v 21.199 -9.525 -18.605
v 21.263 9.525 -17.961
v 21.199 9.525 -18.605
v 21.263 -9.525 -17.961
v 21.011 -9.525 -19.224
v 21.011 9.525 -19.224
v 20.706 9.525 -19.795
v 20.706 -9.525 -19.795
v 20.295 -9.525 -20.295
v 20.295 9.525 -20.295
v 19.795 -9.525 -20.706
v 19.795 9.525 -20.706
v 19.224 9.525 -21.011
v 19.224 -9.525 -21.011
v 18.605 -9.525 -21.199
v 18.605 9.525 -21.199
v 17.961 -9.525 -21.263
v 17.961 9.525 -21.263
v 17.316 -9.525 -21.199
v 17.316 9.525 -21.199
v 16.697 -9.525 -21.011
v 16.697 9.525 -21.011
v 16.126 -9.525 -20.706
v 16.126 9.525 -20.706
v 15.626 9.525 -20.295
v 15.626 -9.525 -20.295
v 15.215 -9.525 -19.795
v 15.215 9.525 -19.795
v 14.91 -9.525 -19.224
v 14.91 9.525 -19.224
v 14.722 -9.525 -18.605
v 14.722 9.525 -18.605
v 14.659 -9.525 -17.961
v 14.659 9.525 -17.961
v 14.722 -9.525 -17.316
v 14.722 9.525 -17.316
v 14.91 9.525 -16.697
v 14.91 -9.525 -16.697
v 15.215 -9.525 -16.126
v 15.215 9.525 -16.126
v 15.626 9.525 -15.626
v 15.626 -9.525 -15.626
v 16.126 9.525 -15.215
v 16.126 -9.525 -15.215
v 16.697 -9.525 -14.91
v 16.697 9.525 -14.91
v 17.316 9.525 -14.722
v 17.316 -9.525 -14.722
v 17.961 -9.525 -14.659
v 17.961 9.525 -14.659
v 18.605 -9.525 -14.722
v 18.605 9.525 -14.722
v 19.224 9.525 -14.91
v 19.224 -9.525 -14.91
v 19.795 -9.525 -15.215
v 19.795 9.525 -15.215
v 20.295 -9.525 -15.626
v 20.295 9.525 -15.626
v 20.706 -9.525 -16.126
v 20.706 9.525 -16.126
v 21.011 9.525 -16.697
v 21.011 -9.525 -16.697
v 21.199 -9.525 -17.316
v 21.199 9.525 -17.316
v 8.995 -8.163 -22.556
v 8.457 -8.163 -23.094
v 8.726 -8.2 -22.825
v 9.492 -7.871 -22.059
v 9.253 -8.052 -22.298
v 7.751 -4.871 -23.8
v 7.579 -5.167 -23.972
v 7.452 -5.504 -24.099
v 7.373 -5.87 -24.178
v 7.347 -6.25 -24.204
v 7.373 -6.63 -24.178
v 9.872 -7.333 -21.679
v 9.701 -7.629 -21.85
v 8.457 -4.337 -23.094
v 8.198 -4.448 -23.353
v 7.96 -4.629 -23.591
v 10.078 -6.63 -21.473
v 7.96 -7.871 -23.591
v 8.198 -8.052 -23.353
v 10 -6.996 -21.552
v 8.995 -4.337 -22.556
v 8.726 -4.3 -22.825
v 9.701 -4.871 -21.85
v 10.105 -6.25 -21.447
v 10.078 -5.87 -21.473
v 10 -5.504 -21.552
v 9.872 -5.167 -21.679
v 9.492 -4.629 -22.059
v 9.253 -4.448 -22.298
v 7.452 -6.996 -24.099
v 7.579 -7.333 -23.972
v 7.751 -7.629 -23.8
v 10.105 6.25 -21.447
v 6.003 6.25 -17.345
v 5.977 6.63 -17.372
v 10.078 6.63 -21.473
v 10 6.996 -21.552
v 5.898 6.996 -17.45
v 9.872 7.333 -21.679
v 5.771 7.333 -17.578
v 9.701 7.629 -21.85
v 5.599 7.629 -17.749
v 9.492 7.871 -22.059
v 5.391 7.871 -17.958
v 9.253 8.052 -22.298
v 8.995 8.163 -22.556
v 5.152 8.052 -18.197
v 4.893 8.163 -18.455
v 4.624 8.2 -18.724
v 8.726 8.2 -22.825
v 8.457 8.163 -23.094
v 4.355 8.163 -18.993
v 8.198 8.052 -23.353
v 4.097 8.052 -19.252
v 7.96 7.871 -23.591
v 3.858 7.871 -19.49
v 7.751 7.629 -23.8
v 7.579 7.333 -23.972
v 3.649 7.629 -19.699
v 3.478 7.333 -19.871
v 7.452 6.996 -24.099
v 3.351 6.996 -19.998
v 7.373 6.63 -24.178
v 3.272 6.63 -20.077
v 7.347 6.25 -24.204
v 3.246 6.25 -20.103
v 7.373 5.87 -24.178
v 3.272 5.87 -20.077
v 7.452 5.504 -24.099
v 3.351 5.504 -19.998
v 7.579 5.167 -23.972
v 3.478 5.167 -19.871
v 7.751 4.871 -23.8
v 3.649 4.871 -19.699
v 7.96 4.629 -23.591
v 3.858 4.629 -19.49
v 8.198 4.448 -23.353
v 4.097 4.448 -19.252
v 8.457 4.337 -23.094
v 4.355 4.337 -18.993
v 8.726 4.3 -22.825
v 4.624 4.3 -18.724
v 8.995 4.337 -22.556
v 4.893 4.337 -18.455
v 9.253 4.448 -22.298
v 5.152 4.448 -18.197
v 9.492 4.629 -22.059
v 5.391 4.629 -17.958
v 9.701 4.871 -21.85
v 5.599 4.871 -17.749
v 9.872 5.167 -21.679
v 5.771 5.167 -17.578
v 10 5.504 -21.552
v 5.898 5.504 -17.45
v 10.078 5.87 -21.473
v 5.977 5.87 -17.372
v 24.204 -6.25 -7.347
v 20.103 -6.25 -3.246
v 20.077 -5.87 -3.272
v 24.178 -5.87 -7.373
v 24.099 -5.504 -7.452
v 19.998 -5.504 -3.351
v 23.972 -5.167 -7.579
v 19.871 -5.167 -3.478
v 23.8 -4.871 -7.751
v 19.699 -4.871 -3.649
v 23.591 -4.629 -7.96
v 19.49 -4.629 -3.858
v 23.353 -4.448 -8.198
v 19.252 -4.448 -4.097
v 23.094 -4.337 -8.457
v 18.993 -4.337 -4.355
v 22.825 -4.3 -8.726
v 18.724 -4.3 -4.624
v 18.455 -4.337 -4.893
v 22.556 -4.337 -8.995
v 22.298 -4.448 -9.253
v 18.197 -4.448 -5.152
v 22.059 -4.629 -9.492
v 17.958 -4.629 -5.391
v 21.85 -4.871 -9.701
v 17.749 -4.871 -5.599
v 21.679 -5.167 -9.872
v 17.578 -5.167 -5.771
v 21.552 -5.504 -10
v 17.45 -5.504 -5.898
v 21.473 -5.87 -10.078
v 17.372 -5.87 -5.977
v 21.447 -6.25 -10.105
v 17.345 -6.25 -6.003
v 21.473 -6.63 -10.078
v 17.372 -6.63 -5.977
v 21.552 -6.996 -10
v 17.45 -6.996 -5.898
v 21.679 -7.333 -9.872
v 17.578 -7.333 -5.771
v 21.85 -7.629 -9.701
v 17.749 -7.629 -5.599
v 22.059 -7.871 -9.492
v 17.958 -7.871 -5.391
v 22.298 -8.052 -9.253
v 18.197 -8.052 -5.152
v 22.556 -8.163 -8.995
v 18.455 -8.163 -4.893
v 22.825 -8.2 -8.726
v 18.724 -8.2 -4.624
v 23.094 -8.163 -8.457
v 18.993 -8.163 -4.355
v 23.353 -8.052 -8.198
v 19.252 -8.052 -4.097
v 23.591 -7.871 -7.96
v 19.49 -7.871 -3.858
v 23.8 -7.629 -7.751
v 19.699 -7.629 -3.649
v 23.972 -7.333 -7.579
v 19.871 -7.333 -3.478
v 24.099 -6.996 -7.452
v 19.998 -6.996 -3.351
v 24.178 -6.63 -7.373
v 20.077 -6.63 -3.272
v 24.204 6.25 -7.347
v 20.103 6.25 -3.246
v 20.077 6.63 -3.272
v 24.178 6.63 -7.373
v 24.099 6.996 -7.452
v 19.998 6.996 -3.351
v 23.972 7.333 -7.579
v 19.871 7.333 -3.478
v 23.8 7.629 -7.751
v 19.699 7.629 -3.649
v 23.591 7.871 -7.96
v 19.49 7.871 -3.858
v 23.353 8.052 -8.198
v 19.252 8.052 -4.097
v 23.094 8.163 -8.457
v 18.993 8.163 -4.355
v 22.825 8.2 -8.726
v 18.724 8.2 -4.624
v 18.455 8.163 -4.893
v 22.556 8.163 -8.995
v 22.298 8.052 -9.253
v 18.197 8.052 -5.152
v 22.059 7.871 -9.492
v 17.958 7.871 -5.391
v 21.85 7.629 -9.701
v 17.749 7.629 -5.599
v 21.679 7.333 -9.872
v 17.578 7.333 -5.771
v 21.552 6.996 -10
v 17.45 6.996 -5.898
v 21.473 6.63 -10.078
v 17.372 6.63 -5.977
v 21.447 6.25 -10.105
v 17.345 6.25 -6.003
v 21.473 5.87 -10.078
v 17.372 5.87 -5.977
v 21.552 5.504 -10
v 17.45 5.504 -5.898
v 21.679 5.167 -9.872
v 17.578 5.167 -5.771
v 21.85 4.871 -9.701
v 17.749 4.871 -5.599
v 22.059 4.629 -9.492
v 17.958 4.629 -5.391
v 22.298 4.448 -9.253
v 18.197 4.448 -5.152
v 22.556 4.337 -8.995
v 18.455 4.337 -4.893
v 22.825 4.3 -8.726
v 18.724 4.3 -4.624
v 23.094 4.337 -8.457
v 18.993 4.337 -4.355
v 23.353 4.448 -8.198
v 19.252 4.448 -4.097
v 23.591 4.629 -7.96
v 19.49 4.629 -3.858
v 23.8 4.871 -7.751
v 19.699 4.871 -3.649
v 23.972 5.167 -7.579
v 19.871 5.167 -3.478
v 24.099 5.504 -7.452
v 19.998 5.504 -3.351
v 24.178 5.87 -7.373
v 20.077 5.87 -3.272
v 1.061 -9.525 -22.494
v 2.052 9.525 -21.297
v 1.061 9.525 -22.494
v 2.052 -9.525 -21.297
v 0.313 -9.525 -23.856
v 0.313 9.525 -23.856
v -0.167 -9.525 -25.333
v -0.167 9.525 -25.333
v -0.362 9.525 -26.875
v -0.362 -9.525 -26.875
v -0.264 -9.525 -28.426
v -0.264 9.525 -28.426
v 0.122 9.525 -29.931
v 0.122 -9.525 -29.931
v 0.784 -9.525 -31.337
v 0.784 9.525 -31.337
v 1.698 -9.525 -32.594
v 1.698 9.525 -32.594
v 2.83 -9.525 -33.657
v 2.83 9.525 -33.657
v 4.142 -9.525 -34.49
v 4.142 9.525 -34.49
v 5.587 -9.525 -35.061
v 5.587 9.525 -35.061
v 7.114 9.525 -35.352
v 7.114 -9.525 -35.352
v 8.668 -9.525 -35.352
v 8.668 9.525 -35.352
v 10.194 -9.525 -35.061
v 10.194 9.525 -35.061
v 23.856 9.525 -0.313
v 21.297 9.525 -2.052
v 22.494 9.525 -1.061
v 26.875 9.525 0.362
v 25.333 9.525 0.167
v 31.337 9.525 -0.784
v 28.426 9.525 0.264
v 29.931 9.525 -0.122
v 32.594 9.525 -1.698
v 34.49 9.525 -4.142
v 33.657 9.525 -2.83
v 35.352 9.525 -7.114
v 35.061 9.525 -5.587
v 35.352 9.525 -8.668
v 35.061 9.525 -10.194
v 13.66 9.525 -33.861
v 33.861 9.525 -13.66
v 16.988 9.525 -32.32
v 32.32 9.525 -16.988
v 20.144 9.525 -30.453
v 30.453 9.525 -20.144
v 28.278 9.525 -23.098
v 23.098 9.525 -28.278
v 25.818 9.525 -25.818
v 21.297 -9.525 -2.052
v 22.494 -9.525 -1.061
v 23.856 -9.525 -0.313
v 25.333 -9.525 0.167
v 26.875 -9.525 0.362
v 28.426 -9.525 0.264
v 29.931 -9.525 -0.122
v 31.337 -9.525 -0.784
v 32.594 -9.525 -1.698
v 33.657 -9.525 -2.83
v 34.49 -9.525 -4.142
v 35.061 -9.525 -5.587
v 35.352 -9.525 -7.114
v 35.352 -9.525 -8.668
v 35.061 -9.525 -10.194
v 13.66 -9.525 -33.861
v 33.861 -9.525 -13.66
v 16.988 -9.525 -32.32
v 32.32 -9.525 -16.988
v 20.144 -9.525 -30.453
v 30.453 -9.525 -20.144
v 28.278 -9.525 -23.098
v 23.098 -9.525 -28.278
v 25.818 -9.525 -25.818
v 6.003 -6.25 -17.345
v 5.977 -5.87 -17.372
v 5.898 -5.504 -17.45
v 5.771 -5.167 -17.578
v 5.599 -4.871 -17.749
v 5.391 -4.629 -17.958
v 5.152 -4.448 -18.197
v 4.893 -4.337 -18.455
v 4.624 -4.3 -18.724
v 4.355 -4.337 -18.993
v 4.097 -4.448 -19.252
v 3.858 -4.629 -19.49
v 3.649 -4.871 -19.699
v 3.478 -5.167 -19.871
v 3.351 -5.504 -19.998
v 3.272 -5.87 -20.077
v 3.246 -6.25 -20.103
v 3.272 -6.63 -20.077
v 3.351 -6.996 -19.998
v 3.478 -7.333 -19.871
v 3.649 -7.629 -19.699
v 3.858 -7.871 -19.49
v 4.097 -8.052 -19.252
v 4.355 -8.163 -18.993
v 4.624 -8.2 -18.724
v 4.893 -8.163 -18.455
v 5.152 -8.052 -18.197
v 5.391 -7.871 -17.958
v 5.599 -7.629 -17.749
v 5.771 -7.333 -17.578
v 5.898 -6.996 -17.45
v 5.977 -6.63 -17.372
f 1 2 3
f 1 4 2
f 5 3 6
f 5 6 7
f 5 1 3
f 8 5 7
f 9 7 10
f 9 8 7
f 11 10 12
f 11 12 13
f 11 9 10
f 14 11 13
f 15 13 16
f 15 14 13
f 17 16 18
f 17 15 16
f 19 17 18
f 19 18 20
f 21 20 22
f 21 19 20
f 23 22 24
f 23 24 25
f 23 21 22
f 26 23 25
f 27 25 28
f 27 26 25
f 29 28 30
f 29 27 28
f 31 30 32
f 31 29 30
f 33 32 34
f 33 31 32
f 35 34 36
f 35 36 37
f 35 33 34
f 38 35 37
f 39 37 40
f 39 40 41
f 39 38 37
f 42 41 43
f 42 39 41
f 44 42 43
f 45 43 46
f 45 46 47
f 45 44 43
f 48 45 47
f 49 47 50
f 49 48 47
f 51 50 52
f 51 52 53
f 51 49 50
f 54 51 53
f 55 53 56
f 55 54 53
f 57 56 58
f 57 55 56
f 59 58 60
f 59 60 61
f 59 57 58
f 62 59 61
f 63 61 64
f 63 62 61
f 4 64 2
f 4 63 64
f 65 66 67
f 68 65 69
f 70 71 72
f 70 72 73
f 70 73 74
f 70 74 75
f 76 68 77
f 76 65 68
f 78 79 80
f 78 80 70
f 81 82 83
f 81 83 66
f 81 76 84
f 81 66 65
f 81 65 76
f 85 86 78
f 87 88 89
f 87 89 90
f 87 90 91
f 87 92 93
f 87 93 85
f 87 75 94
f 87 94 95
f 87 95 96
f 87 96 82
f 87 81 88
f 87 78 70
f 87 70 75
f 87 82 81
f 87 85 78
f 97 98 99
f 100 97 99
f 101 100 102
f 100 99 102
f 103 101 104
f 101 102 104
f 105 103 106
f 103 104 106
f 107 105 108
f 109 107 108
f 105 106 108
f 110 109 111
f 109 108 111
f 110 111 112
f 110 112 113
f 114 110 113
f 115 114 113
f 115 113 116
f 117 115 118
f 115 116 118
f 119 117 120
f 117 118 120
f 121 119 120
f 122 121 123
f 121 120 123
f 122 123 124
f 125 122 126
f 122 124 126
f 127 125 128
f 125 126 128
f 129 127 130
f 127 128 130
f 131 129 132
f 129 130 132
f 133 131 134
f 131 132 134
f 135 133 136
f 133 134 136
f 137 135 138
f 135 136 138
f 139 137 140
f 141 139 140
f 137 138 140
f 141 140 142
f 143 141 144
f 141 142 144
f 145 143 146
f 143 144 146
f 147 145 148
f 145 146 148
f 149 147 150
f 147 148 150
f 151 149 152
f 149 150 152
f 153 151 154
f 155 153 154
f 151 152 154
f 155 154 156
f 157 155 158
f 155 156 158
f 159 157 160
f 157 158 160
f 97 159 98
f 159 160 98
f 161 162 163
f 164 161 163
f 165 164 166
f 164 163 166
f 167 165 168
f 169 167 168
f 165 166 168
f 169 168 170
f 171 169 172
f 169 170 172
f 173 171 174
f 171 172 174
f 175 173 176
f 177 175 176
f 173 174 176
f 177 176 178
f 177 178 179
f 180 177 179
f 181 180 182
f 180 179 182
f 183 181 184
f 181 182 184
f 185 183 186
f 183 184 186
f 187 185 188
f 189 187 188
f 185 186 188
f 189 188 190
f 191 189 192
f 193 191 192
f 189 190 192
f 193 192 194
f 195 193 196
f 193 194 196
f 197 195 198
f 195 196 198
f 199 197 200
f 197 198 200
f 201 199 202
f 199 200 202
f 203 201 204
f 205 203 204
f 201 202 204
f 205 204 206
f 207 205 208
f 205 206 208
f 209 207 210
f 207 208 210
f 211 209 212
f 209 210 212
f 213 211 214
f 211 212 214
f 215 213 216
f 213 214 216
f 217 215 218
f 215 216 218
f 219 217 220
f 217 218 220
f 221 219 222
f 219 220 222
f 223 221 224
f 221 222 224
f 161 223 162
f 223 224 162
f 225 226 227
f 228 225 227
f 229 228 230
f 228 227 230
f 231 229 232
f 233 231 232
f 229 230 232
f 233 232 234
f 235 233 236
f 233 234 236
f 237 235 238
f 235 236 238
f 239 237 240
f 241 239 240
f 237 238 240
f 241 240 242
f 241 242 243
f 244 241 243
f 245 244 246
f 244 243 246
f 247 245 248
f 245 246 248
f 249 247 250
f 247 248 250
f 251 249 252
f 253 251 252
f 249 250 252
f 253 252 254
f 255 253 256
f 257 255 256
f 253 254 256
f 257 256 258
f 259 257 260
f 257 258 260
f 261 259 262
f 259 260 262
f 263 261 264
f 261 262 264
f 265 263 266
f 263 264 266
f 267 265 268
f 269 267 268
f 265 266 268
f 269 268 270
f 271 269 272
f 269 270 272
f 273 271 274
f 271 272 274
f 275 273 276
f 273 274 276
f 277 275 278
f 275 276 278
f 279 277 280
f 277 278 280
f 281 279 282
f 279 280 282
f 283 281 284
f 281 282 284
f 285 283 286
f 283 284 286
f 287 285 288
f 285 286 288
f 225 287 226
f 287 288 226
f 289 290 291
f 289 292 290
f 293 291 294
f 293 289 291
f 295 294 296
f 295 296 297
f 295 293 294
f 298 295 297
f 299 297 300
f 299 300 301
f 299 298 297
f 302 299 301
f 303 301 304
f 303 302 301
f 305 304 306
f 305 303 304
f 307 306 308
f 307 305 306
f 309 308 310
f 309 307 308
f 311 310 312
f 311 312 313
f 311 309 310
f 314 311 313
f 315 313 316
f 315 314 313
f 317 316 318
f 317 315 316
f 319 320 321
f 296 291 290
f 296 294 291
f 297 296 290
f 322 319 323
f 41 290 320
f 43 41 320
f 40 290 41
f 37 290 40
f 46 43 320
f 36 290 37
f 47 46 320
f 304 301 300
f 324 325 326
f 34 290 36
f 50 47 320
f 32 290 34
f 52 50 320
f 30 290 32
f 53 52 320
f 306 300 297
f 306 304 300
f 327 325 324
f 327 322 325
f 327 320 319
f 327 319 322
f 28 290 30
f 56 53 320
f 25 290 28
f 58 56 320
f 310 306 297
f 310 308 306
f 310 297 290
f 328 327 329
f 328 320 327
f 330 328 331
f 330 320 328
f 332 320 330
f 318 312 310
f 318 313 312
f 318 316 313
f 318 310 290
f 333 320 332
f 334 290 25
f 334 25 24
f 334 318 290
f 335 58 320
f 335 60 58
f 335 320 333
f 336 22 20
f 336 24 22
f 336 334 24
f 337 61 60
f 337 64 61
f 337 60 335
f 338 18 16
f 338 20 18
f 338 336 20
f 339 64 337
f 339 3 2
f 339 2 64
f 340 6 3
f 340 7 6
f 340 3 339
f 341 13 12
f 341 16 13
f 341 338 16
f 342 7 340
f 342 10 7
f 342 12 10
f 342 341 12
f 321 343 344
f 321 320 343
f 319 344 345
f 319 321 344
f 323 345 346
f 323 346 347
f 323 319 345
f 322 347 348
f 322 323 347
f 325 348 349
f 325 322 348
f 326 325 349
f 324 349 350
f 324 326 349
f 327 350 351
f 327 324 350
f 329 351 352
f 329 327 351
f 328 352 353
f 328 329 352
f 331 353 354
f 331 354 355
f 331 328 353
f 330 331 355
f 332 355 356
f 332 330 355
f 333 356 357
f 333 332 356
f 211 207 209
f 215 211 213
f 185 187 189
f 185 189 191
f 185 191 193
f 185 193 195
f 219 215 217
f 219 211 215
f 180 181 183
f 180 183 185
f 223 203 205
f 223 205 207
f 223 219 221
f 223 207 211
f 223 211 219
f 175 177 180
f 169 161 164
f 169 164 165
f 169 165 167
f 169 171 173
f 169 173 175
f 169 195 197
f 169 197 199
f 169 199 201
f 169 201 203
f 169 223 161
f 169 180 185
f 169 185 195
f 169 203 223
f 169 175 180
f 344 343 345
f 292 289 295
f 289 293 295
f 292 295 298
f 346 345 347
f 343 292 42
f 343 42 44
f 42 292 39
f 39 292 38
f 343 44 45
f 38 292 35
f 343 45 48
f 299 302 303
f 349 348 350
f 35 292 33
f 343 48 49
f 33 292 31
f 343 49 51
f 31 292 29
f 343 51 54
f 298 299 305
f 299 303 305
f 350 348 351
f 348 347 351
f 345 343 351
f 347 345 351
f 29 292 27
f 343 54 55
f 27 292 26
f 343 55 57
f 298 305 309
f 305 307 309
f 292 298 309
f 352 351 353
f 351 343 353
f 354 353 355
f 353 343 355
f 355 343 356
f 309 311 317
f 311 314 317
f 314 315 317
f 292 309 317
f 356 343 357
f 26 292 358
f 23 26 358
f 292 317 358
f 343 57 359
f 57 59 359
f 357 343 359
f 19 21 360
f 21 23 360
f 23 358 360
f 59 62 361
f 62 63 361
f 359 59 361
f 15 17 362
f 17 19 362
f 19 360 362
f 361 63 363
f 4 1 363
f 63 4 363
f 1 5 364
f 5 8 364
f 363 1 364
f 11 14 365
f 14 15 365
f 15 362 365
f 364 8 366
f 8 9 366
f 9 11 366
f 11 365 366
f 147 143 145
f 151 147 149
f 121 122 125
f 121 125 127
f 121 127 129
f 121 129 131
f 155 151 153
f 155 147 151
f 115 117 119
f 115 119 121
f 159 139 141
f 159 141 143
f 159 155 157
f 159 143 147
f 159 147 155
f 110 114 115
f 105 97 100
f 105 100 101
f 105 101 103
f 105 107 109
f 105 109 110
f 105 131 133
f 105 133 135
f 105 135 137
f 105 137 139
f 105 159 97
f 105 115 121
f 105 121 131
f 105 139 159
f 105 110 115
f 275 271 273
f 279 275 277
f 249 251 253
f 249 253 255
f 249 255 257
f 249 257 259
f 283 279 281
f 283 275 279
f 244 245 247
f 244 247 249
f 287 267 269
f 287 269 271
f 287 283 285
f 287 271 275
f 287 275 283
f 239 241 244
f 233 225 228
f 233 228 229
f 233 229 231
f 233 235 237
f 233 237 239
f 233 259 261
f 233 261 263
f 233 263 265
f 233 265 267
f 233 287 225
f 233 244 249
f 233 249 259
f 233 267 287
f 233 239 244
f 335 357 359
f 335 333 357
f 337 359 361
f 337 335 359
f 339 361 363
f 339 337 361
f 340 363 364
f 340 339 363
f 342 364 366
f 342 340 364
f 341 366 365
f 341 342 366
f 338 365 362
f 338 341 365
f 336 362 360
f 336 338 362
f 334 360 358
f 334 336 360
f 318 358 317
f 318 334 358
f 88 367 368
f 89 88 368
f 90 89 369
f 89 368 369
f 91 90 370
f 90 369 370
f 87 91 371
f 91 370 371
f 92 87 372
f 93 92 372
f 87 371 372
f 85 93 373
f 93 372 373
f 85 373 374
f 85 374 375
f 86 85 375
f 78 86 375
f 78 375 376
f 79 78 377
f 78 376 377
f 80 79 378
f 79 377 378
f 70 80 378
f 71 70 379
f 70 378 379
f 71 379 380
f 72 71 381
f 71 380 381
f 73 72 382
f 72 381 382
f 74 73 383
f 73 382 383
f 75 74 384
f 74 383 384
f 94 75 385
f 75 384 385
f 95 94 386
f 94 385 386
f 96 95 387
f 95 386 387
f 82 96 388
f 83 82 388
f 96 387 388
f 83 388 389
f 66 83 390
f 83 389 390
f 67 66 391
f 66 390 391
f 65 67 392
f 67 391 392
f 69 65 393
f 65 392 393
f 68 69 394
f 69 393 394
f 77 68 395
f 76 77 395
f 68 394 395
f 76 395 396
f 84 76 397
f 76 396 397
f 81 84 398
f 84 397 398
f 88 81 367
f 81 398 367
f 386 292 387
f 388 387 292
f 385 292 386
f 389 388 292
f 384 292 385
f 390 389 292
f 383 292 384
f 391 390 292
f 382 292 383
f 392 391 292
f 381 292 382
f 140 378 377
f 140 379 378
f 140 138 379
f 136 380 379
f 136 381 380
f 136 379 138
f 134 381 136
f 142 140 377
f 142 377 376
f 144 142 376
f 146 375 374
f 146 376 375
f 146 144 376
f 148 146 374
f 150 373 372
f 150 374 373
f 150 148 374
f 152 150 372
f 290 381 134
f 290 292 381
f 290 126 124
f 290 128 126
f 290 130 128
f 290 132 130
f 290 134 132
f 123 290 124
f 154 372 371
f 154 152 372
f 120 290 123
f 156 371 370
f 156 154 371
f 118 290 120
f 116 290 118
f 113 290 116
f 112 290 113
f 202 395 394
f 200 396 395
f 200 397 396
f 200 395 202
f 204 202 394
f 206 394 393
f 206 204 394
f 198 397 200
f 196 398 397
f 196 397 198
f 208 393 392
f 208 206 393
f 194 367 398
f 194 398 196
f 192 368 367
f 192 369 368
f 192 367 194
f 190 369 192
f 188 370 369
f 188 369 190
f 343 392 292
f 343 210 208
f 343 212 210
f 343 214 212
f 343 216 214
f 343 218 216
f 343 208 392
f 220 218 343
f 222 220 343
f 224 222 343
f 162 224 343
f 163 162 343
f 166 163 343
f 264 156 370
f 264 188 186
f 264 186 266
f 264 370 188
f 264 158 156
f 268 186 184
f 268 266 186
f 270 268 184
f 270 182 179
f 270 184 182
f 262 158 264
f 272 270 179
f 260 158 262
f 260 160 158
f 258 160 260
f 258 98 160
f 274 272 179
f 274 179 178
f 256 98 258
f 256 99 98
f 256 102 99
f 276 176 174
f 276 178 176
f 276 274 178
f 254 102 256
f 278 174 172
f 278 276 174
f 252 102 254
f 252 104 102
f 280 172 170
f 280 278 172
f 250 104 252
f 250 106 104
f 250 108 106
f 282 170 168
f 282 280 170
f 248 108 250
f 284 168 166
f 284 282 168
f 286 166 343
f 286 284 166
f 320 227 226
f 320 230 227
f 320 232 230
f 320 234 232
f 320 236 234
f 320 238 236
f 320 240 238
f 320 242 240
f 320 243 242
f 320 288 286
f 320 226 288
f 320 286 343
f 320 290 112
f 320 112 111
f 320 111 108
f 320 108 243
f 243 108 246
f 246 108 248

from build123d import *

# Parameters (mm, degrees)
SKETCH2_R           = 3.302
BOSS_EXTRUDE2_DEPTH = 9.525
SKETCH4_R           = 1.950000037
CUT_EXTRUDE2_DEPTH  = 5.800000084
FILLET1_R           = 8.255


with BuildPart() as part:
    # Sketch2 → Boss-Extrude2 (new body, symmetric)
    with BuildSketch(Plane(origin=(0, 0, 0), x_dir=(1, 0, 0), z_dir=(0, 1, 0))):
        with BuildLine():
            Line((-11.353721197, 34.702387112), (34.702387112, -11.353721197))
            ThreePointArc((34.702387112, -11.353721197), (25.818236348, 25.818236348), (-11.353721197, 34.702387112))
        make_face()
        with Locations((17.960512242, 17.960512242)):
            Circle(SKETCH2_R, mode=Mode.SUBTRACT)
    extrude(amount=BOSS_EXTRUDE2_DEPTH, both=True)

    # Sketch4 → Cut-Extrude2 (cut)
    with BuildSketch(Plane(origin=(11.674332957, 0, -11.674332957), x_dir=(0.707106781, 0, 0.707106781), z_dir=(-0.707106781, 0, 0.707106781))):
        with Locations((9.969999999, 6.249999946)):
            Circle(SKETCH4_R)
        with Locations((-9.969999999, 6.249999946)):
            Circle(SKETCH4_R)
        with Locations((-9.969999999, -6.249999946)):
            Circle(SKETCH4_R)
        with Locations((9.969999999, -6.249999946)):
            Circle(SKETCH4_R)
    extrude(amount=-CUT_EXTRUDE2_DEPTH, mode=Mode.SUBTRACT)

    # Fillet1
    fillet1_edges = [part.edges().sort_by_distance(p)[0] for p in [
        (34.702387112, 0, 11.353721197),
        (-11.353721197, 0, -34.702387112),
    ]]
    fillet(fillet1_edges, radius=FILLET1_R)


solid = part.part
